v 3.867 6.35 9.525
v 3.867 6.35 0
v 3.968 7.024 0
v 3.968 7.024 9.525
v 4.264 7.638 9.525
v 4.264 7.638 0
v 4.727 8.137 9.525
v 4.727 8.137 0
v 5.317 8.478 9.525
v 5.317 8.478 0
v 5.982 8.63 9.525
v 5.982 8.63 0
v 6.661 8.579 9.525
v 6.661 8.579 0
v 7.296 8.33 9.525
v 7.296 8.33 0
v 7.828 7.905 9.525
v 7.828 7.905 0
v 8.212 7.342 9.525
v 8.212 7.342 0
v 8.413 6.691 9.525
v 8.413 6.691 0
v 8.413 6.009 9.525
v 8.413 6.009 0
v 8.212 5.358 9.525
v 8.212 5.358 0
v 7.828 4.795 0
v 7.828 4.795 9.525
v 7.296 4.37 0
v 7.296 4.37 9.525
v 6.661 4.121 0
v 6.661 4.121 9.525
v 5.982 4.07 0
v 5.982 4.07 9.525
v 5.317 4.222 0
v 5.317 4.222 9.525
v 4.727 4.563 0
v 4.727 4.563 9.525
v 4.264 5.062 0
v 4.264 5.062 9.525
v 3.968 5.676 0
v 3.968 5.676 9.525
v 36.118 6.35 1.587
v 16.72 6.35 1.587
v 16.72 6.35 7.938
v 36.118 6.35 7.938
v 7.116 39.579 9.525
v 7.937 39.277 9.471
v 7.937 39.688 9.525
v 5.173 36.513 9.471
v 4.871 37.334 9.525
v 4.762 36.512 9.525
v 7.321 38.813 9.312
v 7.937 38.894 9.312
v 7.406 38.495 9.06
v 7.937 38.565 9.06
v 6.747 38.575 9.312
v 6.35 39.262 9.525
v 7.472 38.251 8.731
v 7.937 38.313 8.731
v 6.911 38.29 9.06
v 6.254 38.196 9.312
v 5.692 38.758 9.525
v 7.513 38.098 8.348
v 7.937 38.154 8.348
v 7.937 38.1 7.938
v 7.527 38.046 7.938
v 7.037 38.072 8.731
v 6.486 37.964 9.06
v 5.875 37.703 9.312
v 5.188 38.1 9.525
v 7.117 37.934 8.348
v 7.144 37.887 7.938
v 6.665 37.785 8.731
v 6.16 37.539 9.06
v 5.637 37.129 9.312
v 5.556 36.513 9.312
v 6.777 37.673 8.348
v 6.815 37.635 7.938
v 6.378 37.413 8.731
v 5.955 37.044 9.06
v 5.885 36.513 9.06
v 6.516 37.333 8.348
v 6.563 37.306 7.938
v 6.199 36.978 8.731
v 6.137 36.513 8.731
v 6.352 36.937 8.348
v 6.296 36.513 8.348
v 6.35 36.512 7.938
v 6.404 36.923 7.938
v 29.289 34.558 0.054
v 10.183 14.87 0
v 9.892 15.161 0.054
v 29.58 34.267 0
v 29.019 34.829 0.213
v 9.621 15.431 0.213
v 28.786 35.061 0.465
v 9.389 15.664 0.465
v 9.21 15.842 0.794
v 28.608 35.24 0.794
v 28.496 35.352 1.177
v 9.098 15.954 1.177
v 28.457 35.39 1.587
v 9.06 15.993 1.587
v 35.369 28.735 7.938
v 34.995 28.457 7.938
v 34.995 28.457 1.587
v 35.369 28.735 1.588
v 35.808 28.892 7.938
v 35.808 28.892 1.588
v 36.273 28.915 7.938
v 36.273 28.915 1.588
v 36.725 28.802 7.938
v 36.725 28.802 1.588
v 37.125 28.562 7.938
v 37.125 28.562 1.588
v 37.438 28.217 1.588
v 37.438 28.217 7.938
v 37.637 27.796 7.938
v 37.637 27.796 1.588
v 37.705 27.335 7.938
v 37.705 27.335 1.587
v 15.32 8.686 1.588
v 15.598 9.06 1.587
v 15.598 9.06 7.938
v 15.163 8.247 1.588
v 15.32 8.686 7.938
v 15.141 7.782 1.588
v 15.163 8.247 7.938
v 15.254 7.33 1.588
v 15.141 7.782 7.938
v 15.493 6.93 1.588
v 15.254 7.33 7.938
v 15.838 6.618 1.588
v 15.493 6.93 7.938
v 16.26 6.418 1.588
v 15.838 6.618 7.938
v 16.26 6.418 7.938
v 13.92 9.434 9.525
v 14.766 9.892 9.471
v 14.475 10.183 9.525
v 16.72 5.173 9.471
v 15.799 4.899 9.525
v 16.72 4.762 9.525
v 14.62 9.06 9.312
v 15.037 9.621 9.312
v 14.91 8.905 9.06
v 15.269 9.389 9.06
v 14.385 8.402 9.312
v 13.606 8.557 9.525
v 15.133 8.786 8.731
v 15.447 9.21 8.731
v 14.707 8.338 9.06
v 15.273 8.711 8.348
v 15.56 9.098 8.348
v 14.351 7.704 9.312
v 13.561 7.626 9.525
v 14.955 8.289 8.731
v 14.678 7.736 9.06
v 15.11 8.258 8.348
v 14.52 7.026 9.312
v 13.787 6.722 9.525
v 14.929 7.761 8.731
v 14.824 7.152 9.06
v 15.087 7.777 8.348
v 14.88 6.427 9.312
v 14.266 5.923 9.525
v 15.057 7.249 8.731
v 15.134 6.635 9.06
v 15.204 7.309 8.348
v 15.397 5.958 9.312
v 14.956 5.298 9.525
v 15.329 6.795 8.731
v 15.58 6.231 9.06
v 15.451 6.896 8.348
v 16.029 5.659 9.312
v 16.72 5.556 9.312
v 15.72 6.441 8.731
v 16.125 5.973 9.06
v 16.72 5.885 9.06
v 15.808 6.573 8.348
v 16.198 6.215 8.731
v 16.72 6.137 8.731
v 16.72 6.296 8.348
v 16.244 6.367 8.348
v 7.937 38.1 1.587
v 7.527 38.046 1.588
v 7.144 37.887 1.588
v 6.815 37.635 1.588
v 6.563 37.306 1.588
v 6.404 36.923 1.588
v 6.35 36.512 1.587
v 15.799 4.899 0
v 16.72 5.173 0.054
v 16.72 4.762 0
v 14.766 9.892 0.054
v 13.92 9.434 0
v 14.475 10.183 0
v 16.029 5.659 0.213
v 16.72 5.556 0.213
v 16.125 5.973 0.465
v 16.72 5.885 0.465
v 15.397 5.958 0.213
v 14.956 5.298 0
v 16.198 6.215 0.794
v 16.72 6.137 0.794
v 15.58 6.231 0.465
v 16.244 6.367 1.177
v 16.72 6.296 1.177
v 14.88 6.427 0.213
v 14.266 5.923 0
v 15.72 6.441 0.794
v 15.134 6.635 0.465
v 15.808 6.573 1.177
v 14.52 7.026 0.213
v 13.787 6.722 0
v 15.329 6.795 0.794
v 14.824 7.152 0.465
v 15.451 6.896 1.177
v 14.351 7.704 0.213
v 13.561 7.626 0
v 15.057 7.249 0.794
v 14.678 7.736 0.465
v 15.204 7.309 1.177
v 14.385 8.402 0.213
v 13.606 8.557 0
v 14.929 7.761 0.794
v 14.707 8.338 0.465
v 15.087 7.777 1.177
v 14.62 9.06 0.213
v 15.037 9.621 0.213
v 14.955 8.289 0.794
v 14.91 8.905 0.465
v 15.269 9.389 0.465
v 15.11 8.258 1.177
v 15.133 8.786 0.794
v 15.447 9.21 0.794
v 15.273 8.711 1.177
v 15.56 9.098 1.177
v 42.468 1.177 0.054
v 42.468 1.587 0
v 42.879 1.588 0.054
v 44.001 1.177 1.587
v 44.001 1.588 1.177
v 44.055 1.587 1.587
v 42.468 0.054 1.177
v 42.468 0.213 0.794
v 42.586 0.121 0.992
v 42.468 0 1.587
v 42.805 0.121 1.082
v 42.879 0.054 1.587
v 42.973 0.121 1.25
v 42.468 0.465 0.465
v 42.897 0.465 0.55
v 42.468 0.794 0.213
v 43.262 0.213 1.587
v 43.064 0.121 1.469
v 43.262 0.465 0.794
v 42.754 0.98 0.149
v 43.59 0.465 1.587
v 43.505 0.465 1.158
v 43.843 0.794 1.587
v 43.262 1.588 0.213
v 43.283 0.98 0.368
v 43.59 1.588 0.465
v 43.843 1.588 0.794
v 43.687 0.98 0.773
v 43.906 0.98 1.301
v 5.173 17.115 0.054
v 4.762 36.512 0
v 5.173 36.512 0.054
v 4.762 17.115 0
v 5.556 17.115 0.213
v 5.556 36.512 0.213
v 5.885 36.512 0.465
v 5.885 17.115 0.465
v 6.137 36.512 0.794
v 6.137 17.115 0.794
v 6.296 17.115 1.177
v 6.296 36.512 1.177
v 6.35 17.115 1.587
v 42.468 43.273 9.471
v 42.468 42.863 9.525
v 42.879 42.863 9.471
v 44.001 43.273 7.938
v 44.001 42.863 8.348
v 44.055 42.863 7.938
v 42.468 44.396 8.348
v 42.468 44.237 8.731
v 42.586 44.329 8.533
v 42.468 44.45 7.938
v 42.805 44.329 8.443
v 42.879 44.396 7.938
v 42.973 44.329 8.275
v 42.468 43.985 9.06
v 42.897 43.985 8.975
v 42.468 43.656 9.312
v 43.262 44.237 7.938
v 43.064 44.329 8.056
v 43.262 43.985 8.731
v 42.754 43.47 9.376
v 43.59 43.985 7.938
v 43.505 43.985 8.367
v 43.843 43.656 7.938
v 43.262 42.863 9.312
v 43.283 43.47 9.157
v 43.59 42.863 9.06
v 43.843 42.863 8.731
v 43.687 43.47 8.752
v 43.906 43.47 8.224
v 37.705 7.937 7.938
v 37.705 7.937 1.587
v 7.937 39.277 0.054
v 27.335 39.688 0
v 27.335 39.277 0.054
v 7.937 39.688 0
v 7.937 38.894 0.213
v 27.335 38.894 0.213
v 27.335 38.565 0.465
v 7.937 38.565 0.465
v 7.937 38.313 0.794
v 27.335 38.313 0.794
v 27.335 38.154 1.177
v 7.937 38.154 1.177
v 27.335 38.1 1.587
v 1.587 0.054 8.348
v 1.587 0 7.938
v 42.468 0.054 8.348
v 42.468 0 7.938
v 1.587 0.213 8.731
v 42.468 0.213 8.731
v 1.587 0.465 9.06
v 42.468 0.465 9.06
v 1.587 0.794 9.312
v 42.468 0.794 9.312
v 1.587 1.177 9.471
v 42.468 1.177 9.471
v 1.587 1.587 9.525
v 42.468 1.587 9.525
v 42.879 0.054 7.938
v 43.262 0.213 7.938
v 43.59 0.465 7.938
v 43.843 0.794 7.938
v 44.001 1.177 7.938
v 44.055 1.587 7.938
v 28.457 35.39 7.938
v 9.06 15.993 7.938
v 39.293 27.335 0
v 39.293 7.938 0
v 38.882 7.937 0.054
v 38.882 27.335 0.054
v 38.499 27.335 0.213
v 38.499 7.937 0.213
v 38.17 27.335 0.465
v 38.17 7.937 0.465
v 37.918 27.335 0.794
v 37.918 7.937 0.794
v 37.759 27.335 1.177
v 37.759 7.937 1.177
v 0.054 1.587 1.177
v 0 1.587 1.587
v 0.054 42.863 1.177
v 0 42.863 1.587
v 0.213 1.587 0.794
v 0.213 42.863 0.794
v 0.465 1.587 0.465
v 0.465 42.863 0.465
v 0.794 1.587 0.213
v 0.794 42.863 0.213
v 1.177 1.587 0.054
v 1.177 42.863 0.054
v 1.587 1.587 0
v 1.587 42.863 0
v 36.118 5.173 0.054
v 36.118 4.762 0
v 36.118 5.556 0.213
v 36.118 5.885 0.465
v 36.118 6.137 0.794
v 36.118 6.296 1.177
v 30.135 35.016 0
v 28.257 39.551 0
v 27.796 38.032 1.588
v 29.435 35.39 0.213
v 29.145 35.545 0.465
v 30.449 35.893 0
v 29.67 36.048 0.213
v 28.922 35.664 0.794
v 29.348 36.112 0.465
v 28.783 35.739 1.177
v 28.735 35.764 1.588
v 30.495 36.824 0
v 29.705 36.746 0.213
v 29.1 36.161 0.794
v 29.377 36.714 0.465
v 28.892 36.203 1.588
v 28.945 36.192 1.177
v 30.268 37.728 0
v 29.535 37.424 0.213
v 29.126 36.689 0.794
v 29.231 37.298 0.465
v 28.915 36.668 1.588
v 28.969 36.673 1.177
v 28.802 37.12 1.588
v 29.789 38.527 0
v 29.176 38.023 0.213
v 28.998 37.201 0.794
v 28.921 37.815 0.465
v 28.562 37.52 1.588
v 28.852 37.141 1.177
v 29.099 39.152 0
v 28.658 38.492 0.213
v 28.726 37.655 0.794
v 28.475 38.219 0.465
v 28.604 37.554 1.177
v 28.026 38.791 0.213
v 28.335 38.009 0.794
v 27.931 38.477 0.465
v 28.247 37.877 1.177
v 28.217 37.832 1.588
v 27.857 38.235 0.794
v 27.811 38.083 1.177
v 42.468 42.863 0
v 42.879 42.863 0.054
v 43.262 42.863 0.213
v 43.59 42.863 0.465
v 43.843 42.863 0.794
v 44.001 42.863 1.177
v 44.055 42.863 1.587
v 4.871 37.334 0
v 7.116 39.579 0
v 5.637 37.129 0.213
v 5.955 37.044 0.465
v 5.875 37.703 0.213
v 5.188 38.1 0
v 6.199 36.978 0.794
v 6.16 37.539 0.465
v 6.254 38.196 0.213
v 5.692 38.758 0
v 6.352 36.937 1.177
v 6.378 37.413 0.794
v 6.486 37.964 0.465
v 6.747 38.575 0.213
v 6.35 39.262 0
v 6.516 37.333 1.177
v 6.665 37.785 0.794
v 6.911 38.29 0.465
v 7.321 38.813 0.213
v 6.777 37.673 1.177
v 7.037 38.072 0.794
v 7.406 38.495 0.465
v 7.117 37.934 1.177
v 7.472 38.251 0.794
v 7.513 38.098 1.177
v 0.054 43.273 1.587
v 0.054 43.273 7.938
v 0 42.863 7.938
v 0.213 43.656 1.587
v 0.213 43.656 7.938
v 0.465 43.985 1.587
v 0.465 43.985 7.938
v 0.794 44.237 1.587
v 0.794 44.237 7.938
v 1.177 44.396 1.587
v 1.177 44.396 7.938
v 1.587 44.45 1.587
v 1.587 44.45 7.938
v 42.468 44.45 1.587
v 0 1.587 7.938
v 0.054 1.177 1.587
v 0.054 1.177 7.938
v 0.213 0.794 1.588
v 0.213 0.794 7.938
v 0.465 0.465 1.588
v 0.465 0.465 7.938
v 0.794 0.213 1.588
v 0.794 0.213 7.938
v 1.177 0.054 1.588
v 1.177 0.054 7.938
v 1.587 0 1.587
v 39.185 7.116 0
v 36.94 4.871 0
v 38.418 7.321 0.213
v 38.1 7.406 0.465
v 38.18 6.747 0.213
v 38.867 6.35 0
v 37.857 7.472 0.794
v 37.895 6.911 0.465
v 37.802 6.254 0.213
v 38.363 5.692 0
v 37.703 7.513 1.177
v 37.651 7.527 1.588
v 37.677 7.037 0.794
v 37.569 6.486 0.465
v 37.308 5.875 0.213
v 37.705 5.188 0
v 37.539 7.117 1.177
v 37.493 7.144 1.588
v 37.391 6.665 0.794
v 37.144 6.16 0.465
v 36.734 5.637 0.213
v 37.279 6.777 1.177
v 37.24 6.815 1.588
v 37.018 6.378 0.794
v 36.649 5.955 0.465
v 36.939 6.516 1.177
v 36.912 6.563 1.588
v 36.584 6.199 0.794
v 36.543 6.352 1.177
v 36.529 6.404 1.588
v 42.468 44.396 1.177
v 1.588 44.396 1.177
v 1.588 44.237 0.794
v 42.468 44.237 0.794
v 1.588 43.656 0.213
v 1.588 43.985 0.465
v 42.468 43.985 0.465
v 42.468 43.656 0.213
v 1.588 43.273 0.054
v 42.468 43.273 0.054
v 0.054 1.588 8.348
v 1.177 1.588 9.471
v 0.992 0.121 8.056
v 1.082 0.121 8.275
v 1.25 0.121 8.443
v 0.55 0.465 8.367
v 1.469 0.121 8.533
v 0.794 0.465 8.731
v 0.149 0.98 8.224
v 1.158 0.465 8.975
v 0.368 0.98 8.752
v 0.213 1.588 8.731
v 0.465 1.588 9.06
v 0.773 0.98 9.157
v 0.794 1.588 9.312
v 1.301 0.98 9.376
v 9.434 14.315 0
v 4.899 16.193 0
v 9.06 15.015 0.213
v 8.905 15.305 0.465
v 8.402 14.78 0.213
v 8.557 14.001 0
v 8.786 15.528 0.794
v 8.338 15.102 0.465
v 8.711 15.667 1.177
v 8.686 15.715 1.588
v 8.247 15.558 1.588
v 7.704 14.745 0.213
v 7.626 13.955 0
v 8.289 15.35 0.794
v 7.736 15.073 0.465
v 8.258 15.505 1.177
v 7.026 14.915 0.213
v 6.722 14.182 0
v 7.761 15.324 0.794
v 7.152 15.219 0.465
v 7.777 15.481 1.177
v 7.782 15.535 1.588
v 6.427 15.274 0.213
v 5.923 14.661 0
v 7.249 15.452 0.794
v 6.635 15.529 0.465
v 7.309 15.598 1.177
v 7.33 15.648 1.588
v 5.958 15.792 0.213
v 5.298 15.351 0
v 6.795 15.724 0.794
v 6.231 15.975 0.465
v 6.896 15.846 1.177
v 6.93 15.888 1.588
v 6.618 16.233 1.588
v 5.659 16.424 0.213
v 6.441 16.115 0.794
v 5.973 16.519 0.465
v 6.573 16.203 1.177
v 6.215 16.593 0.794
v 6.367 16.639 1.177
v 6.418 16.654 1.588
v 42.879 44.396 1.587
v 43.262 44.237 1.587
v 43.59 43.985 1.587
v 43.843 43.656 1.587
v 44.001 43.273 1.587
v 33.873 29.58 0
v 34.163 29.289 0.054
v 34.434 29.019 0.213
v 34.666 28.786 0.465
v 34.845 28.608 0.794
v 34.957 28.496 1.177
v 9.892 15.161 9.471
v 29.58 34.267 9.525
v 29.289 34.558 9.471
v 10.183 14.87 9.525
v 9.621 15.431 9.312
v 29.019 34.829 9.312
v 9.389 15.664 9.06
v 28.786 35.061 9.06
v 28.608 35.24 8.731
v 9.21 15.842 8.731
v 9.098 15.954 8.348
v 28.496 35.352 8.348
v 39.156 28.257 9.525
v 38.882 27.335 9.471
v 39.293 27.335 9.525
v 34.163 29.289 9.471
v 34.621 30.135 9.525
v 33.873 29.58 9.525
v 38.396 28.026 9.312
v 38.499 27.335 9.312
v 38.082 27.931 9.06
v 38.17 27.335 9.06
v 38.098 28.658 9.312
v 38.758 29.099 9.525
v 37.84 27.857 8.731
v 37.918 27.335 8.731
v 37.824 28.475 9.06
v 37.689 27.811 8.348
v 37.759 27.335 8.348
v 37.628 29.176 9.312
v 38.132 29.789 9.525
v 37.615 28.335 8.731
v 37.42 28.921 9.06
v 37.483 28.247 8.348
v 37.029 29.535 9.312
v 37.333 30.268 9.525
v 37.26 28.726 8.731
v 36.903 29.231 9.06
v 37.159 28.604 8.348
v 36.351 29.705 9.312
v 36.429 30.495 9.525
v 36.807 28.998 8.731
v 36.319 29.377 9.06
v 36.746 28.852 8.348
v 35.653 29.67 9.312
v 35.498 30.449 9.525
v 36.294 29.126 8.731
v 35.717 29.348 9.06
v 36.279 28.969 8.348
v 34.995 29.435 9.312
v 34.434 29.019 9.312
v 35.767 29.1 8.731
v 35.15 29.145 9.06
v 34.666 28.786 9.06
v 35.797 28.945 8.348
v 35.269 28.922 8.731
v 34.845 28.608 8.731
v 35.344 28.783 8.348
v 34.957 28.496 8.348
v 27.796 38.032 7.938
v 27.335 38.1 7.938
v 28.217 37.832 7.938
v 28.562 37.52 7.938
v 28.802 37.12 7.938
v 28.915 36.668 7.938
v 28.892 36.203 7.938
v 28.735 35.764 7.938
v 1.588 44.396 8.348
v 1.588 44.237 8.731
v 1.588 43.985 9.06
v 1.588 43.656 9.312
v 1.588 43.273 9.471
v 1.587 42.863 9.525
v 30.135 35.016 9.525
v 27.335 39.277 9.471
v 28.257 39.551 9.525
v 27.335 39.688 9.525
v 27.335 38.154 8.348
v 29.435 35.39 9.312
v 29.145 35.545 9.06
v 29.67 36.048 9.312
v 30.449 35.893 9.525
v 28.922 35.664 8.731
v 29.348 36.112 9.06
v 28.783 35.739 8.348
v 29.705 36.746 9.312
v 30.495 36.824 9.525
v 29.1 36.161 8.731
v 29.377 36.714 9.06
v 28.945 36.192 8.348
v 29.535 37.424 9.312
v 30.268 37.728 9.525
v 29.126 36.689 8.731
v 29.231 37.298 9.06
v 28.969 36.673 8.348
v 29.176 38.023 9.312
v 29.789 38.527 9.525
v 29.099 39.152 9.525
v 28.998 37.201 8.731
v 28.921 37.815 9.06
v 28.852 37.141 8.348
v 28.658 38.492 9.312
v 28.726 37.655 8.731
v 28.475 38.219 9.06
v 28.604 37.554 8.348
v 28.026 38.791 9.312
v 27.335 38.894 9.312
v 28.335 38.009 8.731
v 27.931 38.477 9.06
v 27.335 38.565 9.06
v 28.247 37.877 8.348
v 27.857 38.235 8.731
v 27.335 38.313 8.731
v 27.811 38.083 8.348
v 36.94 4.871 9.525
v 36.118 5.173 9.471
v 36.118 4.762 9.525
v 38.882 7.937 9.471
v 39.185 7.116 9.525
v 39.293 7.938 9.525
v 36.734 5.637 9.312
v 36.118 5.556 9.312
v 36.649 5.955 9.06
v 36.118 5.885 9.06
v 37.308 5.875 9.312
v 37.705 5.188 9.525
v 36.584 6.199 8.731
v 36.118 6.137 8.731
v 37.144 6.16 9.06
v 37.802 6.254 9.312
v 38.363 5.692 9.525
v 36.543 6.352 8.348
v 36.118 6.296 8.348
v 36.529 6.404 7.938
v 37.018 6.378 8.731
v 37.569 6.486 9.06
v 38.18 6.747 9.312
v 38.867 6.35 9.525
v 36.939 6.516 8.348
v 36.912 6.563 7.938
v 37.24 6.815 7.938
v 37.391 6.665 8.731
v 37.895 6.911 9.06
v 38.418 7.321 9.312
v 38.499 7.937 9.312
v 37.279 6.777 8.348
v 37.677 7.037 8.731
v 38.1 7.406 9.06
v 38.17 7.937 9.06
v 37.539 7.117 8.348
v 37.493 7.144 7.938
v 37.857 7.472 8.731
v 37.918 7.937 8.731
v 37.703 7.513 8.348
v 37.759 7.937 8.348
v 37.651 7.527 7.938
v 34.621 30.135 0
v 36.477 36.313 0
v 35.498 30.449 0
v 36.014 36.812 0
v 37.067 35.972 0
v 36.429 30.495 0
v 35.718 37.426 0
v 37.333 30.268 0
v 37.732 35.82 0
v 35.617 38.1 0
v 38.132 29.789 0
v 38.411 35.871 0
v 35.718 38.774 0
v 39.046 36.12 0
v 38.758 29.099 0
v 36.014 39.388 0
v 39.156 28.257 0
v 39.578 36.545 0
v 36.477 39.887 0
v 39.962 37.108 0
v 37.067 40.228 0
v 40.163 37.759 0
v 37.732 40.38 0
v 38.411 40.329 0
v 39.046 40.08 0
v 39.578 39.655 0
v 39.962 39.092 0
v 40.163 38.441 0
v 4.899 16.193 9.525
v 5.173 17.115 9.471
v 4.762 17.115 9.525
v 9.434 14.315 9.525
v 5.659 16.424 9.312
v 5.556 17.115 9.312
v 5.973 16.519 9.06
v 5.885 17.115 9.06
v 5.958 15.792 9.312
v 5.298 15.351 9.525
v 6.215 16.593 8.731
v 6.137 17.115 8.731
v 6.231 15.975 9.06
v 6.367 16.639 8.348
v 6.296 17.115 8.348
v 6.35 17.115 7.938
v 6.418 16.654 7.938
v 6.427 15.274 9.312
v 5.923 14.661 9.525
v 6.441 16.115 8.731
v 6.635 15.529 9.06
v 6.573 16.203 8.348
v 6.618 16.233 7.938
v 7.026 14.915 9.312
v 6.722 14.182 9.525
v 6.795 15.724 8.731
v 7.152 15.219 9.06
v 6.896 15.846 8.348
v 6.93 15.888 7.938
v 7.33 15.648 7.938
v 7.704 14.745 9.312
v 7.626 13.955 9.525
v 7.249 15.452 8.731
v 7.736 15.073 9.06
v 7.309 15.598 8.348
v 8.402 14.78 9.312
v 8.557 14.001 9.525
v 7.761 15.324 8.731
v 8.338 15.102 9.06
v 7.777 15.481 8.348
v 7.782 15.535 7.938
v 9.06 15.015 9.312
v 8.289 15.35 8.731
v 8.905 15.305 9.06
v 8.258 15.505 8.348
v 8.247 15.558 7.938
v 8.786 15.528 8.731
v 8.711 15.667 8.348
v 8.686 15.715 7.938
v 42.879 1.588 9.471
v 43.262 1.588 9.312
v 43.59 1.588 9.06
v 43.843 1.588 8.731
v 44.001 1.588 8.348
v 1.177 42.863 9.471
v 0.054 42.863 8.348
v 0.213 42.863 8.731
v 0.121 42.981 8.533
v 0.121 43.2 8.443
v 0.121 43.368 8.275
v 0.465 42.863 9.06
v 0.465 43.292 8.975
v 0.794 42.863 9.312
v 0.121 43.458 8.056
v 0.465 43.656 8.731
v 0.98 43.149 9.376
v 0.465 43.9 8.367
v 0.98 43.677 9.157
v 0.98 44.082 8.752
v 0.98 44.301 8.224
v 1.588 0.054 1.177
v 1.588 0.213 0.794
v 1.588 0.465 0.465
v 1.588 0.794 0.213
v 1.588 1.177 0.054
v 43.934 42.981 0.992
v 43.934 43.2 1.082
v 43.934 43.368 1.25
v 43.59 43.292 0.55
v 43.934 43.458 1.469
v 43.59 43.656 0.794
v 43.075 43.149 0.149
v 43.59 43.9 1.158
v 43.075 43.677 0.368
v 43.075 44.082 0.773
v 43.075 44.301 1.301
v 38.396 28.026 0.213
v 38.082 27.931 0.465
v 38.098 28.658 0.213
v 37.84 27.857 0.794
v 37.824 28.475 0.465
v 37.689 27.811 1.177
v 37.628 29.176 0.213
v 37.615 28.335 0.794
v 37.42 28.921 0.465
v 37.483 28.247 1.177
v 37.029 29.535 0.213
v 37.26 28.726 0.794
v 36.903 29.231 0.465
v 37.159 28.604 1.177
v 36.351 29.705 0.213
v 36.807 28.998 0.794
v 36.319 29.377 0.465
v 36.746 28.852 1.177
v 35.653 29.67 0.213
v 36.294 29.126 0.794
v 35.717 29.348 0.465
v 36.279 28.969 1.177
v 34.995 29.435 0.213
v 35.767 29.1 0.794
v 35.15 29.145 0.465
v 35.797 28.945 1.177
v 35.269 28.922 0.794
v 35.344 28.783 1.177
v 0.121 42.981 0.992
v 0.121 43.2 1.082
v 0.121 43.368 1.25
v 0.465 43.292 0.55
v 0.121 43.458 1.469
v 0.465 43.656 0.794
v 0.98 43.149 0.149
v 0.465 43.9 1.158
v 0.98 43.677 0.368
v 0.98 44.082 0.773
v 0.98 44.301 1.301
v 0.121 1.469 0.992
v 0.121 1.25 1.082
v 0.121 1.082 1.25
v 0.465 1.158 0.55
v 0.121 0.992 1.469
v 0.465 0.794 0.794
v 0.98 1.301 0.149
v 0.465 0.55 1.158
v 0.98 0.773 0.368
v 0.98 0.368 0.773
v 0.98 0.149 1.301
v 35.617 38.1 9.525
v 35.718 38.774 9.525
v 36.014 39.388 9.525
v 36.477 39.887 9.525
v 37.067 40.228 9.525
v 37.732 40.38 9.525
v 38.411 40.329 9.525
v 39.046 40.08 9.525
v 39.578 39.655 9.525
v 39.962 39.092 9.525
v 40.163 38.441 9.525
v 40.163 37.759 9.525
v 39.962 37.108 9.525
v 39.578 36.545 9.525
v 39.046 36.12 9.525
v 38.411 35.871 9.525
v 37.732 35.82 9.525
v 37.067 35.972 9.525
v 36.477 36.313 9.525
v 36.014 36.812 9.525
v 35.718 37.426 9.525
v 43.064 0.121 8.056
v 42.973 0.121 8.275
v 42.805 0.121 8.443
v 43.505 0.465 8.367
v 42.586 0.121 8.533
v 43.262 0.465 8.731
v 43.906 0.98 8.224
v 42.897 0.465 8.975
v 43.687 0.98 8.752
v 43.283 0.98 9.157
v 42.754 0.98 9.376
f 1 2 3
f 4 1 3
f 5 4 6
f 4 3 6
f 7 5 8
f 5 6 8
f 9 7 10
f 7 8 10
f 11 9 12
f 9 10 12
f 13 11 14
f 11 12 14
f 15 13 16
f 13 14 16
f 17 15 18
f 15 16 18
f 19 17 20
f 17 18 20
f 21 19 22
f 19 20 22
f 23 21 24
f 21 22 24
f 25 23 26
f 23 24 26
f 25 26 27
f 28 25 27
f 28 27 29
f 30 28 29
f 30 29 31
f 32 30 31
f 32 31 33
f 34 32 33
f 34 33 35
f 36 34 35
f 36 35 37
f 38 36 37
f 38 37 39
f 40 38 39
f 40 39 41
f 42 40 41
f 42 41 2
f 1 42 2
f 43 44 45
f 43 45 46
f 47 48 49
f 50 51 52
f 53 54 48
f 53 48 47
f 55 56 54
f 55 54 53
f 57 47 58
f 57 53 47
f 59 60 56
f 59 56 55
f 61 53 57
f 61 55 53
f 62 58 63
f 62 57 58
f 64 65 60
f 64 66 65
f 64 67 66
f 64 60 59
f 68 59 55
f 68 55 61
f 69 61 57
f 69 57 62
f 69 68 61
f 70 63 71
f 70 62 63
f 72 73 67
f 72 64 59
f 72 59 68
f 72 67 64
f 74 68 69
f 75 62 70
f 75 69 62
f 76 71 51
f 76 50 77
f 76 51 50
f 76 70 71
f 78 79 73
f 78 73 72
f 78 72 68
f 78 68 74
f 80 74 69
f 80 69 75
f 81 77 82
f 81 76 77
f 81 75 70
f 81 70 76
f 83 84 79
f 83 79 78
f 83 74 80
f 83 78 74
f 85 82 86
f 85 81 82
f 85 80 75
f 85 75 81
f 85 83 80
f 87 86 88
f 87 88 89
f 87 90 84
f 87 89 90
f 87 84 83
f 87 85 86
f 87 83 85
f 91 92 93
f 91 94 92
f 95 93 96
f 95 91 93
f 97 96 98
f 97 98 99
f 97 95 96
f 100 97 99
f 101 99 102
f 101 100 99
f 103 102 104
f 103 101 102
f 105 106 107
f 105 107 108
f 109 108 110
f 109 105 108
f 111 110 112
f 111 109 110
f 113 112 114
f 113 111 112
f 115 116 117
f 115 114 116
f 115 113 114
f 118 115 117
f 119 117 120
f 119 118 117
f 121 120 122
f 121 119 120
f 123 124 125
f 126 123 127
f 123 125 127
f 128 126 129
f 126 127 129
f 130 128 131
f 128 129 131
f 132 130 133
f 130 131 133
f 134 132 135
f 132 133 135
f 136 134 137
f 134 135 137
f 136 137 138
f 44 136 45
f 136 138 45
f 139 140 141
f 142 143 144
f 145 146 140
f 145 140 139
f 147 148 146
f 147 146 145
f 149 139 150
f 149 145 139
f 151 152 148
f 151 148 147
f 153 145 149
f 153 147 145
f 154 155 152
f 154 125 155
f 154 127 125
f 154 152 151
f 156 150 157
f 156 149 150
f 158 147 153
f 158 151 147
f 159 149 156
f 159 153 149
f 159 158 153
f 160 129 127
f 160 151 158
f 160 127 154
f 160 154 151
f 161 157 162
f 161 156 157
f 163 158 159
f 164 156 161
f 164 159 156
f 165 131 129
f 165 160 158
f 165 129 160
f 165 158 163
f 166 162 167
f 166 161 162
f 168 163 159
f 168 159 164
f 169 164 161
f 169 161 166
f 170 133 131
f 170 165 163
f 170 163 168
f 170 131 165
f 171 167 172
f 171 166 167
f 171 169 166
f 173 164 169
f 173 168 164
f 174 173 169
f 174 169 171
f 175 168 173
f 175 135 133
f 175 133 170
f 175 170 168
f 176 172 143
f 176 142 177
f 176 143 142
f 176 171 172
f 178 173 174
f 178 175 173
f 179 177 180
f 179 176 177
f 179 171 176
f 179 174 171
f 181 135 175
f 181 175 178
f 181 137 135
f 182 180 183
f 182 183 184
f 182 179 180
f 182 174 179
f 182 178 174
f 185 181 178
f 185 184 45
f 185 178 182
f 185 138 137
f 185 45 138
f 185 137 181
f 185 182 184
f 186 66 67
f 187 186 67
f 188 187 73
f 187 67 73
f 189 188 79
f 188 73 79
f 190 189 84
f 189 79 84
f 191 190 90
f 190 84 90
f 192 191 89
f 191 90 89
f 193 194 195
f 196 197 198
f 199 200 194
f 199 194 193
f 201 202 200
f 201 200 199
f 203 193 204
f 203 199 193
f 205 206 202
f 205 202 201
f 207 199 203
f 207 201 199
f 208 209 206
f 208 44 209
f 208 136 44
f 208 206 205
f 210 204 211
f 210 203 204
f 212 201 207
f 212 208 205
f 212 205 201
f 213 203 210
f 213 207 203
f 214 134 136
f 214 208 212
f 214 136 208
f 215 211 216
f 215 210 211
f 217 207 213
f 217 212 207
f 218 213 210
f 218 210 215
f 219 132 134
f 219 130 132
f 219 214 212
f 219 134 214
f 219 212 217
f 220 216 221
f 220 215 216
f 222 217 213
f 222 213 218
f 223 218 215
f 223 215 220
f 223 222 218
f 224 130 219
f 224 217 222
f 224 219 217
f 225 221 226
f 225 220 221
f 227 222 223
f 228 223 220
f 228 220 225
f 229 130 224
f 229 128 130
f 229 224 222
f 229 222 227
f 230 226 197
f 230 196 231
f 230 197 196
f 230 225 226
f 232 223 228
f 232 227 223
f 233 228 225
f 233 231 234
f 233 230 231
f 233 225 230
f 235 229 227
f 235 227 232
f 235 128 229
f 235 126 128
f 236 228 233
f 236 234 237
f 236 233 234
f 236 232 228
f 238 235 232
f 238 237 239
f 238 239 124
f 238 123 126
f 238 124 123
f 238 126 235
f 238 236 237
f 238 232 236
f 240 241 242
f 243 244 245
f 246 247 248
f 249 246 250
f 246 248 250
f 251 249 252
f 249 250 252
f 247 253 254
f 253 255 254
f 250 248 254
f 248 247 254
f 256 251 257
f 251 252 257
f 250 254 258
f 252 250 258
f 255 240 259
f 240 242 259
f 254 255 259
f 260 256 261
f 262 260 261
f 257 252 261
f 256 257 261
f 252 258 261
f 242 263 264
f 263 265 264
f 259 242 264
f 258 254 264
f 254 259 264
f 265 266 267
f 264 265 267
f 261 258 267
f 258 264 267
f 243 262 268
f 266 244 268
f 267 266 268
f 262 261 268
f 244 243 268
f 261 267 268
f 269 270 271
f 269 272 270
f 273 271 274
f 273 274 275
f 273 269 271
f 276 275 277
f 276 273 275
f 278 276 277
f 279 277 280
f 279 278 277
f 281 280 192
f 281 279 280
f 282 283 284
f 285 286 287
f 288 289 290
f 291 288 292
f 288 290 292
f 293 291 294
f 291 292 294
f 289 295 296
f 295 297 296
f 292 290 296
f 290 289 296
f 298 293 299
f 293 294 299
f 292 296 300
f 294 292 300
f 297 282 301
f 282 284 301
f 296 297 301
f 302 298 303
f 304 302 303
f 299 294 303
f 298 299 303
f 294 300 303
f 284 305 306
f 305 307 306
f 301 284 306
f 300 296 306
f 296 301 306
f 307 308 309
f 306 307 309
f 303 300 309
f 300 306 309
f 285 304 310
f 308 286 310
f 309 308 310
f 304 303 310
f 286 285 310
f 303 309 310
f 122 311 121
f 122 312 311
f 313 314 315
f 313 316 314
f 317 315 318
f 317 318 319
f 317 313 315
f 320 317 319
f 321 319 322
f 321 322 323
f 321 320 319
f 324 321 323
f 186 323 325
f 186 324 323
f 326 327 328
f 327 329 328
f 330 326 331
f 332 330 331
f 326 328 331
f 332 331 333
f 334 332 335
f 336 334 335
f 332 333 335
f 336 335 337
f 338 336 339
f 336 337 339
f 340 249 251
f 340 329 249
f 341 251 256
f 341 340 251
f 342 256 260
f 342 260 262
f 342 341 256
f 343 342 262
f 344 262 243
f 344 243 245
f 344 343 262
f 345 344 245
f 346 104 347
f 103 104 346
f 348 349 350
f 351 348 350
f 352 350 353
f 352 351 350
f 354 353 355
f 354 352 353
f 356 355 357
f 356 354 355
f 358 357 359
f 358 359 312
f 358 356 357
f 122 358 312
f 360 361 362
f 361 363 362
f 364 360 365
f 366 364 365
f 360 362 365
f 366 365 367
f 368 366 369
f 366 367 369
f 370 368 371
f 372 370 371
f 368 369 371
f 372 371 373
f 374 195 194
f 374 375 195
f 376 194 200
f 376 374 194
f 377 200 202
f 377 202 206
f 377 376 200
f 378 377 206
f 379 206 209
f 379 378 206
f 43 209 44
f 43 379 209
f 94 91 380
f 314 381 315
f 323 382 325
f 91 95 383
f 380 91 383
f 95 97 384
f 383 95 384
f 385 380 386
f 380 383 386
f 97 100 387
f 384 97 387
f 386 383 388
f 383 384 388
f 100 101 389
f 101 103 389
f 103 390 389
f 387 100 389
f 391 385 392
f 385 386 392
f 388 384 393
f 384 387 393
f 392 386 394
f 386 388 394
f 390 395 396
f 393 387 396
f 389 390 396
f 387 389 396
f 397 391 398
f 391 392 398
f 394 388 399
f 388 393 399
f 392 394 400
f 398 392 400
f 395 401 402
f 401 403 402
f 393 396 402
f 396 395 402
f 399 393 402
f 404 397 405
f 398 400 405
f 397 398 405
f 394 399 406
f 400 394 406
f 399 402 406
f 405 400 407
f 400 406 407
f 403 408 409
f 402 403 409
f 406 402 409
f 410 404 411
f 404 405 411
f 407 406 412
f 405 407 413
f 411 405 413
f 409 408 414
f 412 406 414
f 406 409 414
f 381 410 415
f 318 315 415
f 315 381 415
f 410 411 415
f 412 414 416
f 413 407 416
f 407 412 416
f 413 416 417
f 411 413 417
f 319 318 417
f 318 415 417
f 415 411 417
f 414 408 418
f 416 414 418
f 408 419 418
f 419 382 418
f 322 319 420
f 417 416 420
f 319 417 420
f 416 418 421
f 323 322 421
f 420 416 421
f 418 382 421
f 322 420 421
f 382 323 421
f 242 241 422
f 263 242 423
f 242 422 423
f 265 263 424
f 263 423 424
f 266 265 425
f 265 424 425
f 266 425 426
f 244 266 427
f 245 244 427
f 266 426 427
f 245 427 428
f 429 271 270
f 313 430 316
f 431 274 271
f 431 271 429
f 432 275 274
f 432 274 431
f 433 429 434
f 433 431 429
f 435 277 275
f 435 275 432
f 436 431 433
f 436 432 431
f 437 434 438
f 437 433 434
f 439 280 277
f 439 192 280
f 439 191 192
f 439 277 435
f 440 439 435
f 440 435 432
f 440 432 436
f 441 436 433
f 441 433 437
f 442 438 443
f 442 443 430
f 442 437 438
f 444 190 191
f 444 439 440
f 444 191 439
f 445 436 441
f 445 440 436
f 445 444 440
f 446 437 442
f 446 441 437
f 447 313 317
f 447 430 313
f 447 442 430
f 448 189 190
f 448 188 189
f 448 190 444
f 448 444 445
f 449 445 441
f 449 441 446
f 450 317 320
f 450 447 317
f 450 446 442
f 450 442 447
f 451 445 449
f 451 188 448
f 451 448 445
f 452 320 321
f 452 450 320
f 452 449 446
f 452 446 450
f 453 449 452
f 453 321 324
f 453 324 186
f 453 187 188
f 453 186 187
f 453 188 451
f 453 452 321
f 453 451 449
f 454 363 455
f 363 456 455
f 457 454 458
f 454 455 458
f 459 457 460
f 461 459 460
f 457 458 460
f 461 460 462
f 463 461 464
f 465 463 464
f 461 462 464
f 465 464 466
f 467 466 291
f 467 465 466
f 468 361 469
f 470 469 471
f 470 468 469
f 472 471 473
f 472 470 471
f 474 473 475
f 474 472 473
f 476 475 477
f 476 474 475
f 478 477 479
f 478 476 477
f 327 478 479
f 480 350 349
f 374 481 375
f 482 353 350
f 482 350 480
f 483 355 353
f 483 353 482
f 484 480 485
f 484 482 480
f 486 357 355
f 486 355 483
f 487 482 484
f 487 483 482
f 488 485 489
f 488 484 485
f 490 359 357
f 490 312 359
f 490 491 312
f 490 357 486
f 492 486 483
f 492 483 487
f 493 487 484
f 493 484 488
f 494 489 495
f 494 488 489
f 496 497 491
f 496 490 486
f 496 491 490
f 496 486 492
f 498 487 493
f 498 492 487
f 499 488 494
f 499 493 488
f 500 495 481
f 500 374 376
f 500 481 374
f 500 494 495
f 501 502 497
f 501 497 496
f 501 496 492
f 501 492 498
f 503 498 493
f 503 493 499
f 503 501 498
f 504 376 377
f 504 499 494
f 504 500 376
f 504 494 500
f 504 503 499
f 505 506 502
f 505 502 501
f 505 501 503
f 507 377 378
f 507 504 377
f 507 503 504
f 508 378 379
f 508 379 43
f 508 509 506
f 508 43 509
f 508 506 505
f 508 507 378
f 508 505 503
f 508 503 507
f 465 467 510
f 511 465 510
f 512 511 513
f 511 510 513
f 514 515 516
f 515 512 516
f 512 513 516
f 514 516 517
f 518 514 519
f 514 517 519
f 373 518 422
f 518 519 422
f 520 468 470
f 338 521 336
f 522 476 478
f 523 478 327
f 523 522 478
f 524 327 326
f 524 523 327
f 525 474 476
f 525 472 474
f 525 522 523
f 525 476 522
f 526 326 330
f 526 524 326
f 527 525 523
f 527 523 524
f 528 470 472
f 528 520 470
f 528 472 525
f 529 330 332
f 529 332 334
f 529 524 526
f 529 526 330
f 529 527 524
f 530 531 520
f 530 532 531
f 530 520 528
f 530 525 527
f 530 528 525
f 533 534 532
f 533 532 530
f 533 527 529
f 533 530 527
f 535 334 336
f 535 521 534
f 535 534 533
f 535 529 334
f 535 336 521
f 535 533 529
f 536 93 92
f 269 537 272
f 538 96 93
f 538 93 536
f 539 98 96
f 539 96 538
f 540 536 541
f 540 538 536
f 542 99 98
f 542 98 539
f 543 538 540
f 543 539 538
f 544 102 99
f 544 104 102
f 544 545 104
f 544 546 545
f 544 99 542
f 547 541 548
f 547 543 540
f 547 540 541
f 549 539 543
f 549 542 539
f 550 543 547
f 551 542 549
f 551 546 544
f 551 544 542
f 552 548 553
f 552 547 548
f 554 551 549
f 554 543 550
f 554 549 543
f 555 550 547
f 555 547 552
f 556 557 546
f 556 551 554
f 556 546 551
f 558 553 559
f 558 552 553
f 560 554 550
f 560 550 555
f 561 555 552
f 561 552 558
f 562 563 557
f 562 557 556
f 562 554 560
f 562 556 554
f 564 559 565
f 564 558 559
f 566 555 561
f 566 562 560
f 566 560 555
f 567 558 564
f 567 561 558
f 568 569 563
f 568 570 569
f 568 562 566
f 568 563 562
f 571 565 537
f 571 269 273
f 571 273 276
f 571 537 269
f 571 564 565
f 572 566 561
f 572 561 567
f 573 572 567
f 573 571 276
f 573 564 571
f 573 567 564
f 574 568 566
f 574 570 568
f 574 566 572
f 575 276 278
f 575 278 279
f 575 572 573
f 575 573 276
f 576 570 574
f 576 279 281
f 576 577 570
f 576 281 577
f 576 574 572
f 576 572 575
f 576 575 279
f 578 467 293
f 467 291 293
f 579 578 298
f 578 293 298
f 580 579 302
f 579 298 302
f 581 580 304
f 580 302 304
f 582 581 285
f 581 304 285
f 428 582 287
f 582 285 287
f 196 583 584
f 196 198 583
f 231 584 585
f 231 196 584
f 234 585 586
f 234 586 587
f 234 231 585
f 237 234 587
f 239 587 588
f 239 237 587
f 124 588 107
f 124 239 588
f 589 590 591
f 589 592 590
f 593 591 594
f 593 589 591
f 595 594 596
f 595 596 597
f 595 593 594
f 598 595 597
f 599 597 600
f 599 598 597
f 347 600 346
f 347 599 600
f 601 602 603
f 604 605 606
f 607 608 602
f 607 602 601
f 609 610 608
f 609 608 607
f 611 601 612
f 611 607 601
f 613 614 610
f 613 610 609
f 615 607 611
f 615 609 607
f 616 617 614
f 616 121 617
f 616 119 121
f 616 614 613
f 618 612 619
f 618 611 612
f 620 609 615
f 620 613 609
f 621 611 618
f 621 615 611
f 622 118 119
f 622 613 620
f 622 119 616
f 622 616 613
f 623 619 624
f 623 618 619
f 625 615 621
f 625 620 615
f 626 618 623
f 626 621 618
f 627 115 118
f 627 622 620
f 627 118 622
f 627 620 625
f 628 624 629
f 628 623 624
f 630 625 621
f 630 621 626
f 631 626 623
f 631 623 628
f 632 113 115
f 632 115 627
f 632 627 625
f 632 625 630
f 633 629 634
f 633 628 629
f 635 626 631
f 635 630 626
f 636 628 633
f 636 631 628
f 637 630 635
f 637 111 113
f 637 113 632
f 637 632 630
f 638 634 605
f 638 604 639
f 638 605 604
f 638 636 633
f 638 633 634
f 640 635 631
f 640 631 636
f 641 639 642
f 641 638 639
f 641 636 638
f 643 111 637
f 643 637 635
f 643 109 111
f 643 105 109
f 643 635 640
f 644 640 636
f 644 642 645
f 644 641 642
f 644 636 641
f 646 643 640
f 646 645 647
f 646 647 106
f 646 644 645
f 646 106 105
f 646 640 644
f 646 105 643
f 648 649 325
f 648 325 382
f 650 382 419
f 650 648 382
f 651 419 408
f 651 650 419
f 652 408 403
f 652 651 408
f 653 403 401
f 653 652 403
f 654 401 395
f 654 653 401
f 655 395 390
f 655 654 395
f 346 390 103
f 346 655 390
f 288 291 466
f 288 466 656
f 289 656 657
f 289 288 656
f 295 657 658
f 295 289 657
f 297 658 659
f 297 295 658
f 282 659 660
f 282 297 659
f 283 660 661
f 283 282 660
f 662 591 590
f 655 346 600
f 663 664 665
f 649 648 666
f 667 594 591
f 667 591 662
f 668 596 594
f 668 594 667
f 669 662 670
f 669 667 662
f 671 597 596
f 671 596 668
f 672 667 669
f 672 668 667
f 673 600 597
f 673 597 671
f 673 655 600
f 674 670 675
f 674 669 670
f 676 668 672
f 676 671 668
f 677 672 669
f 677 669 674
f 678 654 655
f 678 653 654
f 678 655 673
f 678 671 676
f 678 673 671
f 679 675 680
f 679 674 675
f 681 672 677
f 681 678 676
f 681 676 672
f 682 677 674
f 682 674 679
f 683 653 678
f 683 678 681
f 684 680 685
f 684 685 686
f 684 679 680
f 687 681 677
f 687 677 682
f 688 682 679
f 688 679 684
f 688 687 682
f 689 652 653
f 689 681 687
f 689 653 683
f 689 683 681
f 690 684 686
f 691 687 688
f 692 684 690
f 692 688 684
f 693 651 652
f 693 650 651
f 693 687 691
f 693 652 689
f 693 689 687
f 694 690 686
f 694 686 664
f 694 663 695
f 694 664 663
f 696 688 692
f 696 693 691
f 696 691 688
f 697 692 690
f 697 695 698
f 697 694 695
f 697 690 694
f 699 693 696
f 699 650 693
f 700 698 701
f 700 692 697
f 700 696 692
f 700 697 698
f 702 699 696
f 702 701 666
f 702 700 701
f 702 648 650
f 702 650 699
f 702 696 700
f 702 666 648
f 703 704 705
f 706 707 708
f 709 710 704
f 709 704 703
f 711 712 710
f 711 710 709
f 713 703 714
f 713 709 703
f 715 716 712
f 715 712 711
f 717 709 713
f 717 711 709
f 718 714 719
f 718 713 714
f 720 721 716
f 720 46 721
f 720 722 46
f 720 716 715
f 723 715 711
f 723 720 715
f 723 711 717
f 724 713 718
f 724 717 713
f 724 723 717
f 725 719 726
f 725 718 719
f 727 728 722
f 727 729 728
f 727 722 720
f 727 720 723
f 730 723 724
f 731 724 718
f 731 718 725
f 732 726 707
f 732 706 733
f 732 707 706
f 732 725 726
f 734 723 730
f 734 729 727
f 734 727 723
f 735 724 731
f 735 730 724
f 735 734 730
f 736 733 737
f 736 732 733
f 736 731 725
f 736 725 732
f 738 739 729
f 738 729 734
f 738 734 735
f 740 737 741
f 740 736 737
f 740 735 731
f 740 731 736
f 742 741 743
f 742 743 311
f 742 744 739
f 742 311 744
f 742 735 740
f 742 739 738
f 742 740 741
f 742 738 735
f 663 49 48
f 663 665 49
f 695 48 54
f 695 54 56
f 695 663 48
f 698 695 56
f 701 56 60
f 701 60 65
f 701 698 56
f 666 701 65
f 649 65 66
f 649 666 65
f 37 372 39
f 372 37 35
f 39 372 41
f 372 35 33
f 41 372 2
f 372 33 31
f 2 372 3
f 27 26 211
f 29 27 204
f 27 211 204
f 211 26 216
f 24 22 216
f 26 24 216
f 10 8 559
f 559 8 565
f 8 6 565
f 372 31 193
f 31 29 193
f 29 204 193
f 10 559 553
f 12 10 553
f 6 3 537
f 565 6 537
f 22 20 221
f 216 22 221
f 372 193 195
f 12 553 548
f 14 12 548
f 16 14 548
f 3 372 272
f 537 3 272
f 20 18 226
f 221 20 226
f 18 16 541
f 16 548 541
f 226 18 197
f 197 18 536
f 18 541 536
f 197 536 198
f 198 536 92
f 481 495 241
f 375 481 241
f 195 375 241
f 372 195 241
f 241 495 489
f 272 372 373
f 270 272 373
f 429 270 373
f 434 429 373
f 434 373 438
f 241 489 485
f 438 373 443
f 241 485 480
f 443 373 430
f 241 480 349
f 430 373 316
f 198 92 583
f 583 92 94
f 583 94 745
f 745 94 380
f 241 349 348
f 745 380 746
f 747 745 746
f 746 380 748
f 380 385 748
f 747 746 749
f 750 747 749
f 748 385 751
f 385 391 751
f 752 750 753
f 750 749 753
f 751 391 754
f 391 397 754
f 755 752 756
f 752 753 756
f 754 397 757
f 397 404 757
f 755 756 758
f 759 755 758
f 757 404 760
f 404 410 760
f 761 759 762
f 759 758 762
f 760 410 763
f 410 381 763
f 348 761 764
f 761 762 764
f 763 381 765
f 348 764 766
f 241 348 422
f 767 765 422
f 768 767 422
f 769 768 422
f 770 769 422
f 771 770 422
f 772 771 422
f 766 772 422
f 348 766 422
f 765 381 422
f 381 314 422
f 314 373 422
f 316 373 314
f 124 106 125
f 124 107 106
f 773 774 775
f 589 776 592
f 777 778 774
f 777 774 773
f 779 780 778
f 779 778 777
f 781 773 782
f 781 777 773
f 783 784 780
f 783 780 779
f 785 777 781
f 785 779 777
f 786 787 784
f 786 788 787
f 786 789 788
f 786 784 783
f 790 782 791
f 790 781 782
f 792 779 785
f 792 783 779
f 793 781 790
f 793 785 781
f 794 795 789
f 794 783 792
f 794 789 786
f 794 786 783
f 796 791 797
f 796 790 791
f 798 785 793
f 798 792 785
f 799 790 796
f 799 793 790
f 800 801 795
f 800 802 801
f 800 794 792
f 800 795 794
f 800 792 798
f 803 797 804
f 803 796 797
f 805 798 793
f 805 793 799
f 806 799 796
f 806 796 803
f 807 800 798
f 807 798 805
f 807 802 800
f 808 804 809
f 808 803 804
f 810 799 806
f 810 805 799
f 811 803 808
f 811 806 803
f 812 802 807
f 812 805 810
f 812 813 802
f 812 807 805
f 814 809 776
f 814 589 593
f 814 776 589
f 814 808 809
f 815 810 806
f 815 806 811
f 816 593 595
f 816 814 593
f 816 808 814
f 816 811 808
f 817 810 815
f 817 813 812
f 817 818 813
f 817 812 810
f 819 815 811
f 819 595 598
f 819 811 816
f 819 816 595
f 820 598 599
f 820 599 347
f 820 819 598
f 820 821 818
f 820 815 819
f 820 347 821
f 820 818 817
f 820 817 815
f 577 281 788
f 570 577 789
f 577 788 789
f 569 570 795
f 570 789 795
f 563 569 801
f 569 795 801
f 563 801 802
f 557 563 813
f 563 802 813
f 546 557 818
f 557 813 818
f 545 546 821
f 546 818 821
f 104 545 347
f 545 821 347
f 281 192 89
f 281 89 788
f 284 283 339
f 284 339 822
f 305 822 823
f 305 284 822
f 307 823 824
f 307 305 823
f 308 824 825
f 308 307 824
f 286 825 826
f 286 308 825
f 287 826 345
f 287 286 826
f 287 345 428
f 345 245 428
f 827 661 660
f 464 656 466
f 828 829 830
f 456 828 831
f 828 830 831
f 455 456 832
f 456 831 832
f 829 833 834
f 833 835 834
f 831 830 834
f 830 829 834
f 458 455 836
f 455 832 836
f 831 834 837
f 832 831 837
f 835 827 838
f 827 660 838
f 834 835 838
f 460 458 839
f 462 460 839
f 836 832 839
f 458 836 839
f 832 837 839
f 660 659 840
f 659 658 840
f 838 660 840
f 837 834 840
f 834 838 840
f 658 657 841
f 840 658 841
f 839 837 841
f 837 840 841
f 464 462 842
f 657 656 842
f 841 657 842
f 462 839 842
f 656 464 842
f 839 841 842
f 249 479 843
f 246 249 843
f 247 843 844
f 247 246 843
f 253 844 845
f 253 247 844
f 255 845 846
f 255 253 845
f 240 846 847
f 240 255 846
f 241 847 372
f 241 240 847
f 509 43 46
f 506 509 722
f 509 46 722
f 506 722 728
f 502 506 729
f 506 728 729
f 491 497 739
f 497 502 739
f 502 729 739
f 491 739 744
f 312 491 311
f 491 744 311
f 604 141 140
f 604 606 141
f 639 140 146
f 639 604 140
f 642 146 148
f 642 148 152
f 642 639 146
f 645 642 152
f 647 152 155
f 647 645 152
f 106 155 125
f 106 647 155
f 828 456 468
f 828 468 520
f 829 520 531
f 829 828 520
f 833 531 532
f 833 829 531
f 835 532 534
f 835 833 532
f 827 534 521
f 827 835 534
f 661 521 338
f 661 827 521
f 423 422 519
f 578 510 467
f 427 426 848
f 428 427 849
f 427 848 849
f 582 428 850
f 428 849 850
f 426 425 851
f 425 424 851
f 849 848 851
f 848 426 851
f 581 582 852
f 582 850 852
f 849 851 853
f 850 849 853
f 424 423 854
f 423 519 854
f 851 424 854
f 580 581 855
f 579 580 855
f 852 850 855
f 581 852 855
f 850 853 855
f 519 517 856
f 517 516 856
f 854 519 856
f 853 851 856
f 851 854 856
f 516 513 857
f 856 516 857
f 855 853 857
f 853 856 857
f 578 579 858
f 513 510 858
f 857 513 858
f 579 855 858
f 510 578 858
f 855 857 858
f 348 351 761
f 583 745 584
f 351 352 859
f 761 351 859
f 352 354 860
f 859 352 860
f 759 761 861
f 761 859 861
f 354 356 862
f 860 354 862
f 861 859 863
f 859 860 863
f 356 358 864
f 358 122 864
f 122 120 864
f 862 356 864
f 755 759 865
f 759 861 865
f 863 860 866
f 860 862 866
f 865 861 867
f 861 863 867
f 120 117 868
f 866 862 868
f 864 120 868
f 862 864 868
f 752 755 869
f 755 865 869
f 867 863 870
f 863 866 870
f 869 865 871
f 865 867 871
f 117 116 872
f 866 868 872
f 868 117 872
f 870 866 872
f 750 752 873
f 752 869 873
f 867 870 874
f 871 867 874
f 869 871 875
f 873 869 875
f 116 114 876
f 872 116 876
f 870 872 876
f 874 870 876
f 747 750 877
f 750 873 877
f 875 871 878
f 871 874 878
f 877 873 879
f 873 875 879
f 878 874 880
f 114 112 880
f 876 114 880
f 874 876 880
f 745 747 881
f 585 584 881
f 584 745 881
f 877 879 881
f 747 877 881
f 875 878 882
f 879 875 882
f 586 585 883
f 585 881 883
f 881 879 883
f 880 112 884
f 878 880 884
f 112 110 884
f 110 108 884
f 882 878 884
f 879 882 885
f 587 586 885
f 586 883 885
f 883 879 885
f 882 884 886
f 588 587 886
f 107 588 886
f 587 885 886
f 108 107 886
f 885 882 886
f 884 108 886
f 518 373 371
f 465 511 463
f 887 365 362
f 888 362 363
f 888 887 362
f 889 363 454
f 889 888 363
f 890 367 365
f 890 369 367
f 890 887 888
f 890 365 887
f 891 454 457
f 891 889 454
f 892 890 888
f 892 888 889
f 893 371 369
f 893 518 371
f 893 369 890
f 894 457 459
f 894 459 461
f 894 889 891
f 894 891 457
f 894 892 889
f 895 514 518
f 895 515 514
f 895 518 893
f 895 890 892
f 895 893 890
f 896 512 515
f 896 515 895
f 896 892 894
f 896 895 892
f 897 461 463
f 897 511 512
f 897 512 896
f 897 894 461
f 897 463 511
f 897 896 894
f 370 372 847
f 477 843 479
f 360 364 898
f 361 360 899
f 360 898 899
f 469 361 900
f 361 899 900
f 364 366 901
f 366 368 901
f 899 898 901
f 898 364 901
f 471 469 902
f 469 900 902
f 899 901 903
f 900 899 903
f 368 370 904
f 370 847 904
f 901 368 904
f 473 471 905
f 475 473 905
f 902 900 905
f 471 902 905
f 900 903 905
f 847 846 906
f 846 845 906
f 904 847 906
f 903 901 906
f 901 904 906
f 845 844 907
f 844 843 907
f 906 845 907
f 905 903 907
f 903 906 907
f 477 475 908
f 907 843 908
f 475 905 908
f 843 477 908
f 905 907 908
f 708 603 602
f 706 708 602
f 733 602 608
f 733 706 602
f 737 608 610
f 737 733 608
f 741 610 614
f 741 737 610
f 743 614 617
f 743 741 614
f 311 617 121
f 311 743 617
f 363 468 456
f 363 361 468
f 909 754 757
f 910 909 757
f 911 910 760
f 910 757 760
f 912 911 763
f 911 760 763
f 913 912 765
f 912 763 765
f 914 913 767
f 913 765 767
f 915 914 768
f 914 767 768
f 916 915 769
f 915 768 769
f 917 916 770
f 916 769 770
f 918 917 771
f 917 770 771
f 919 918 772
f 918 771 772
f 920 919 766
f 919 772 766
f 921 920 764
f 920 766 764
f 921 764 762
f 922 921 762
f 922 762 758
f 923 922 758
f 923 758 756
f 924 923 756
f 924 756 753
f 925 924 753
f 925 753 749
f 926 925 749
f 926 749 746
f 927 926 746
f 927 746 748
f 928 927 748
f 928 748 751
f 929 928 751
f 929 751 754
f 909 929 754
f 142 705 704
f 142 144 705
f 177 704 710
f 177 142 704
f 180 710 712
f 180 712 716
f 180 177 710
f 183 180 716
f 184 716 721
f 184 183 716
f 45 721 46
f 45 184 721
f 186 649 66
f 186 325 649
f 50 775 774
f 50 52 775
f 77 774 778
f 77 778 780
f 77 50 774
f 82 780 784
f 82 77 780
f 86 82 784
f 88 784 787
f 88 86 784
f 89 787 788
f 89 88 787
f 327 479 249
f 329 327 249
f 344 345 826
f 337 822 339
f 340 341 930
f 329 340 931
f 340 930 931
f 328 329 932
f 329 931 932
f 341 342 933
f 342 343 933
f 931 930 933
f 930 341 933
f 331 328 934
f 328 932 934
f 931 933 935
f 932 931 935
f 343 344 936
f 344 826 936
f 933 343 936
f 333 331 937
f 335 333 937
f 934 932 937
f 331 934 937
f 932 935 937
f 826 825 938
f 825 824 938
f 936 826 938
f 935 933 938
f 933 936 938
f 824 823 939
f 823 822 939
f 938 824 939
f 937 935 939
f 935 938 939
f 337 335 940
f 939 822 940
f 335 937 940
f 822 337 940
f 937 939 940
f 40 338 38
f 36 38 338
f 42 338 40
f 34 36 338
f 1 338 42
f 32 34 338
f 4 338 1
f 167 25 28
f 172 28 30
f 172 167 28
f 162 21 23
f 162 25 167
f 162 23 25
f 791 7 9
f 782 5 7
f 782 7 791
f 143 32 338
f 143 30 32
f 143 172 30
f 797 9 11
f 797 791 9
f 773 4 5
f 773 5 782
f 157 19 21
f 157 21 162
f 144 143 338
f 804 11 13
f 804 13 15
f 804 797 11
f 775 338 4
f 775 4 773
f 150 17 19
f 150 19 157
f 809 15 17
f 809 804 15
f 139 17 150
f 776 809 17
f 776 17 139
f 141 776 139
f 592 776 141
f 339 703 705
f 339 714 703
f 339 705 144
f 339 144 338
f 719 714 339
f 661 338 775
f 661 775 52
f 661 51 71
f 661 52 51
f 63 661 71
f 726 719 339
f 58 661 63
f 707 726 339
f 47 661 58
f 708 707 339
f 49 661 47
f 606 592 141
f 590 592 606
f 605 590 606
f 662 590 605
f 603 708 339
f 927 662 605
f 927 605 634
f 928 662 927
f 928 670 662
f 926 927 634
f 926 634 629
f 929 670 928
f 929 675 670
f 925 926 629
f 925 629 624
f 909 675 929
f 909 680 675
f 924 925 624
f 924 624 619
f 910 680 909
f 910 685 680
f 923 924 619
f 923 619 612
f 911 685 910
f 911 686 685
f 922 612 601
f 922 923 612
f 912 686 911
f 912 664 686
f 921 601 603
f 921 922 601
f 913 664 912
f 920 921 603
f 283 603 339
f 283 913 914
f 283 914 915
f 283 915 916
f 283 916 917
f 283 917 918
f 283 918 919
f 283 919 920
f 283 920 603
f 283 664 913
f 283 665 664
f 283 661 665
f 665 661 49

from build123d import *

# Parameters (mm, degrees)
SKETCH1_W           = 44.05525725
SKETCH1_H           = 44.45
BOSS_EXTRUDE1_DEPTH = 9.525
SKETCH2_R           = 2.286
CUT_EXTRUDE1_DEPTH  = 64.303979467
CUT_EXTRUDE2_DEPTH  = 64.303979467
FILLET1_R           = 1.5875


with BuildPart() as part:
    # Sketch1 → Boss-Extrude1 (new body)
    with BuildSketch(Plane.XY):
        with Locations((22.027628625, 22.225)):
            Rectangle(SKETCH1_W, SKETCH1_H)
    extrude(amount=BOSS_EXTRUDE1_DEPTH)

    # Sketch2 → Cut-Extrude1 (cut, through all)
    with BuildSketch(Plane(origin=(0, 0, 0), x_dir=(-1, 0, 0), z_dir=(0, 0, -1))):
        with Locations((-37.902628625, 38.1)):
            Circle(SKETCH2_R)
        with Locations((-6.152628625, 6.35)):
            Circle(SKETCH2_R)
    extrude(amount=-CUT_EXTRUDE1_DEPTH, mode=Mode.SUBTRACT)

    # Sketch3 → Cut-Extrude2 (cut, through all)
    with BuildSketch(Plane(origin=(0, 0, 0), x_dir=(-1, 0, 0), z_dir=(0, 0, -1))):
        Polygon((-31.167436534, 38.1), (-6.35, 38.1), (-6.35, 13.282563466), align=None)
        Polygon((-37.70525725, 31.167436534), (-12.887820716, 6.35), (-37.70525725, 6.35), align=None)
    extrude(amount=-CUT_EXTRUDE2_DEPTH, mode=Mode.SUBTRACT)

    # Fillet1
    fillet1_edges = [part.edges().sort_by_distance(p)[0] for p in [
        (44.05525725, 22.225, 9.525),
        (22.027628625, 44.45, 9.525),
        (37.70525725, 18.758718267, 9.525),
        (37.70525725, 6.35, 4.7625),
        (25.296538983, 18.758718267, 9.525),
        (37.70525725, 31.167436534, 4.7625),
        (25.296538983, 6.35, 9.525),
        (12.887820716, 6.35, 4.7625),
        (37.70525725, 18.758718267, 0),
        (25.296538983, 6.35, 0),
        (25.296538983, 18.758718267, 0),
        (18.758718267, 25.691281733, 9.525),
        (6.35, 13.282563466, 4.7625),
        (18.758718267, 38.1, 9.525),
        (31.167436534, 38.1, 4.7625),
        (6.35, 25.691281733, 9.525),
        (6.35, 38.1, 4.7625),
        (18.758718267, 25.691281733, 0),
        (6.35, 25.691281733, 0),
        (18.758718267, 38.1, 0),
        (0, 22.225, 9.525),
        (22.027628625, 44.45, 0),
        (44.05525725, 22.225, 0),
        (22.027628625, 0, 0),
        (0, 22.225, 0),
        (0, 44.45, 4.7625),
        (44.05525725, 44.45, 4.7625),
        (44.05525725, 0, 4.7625),
        (0, 0, 4.7625),
        (22.027628625, 0, 9.525),
    ]]
    fillet(fillet1_edges, radius=FILLET1_R)


solid = part.part
